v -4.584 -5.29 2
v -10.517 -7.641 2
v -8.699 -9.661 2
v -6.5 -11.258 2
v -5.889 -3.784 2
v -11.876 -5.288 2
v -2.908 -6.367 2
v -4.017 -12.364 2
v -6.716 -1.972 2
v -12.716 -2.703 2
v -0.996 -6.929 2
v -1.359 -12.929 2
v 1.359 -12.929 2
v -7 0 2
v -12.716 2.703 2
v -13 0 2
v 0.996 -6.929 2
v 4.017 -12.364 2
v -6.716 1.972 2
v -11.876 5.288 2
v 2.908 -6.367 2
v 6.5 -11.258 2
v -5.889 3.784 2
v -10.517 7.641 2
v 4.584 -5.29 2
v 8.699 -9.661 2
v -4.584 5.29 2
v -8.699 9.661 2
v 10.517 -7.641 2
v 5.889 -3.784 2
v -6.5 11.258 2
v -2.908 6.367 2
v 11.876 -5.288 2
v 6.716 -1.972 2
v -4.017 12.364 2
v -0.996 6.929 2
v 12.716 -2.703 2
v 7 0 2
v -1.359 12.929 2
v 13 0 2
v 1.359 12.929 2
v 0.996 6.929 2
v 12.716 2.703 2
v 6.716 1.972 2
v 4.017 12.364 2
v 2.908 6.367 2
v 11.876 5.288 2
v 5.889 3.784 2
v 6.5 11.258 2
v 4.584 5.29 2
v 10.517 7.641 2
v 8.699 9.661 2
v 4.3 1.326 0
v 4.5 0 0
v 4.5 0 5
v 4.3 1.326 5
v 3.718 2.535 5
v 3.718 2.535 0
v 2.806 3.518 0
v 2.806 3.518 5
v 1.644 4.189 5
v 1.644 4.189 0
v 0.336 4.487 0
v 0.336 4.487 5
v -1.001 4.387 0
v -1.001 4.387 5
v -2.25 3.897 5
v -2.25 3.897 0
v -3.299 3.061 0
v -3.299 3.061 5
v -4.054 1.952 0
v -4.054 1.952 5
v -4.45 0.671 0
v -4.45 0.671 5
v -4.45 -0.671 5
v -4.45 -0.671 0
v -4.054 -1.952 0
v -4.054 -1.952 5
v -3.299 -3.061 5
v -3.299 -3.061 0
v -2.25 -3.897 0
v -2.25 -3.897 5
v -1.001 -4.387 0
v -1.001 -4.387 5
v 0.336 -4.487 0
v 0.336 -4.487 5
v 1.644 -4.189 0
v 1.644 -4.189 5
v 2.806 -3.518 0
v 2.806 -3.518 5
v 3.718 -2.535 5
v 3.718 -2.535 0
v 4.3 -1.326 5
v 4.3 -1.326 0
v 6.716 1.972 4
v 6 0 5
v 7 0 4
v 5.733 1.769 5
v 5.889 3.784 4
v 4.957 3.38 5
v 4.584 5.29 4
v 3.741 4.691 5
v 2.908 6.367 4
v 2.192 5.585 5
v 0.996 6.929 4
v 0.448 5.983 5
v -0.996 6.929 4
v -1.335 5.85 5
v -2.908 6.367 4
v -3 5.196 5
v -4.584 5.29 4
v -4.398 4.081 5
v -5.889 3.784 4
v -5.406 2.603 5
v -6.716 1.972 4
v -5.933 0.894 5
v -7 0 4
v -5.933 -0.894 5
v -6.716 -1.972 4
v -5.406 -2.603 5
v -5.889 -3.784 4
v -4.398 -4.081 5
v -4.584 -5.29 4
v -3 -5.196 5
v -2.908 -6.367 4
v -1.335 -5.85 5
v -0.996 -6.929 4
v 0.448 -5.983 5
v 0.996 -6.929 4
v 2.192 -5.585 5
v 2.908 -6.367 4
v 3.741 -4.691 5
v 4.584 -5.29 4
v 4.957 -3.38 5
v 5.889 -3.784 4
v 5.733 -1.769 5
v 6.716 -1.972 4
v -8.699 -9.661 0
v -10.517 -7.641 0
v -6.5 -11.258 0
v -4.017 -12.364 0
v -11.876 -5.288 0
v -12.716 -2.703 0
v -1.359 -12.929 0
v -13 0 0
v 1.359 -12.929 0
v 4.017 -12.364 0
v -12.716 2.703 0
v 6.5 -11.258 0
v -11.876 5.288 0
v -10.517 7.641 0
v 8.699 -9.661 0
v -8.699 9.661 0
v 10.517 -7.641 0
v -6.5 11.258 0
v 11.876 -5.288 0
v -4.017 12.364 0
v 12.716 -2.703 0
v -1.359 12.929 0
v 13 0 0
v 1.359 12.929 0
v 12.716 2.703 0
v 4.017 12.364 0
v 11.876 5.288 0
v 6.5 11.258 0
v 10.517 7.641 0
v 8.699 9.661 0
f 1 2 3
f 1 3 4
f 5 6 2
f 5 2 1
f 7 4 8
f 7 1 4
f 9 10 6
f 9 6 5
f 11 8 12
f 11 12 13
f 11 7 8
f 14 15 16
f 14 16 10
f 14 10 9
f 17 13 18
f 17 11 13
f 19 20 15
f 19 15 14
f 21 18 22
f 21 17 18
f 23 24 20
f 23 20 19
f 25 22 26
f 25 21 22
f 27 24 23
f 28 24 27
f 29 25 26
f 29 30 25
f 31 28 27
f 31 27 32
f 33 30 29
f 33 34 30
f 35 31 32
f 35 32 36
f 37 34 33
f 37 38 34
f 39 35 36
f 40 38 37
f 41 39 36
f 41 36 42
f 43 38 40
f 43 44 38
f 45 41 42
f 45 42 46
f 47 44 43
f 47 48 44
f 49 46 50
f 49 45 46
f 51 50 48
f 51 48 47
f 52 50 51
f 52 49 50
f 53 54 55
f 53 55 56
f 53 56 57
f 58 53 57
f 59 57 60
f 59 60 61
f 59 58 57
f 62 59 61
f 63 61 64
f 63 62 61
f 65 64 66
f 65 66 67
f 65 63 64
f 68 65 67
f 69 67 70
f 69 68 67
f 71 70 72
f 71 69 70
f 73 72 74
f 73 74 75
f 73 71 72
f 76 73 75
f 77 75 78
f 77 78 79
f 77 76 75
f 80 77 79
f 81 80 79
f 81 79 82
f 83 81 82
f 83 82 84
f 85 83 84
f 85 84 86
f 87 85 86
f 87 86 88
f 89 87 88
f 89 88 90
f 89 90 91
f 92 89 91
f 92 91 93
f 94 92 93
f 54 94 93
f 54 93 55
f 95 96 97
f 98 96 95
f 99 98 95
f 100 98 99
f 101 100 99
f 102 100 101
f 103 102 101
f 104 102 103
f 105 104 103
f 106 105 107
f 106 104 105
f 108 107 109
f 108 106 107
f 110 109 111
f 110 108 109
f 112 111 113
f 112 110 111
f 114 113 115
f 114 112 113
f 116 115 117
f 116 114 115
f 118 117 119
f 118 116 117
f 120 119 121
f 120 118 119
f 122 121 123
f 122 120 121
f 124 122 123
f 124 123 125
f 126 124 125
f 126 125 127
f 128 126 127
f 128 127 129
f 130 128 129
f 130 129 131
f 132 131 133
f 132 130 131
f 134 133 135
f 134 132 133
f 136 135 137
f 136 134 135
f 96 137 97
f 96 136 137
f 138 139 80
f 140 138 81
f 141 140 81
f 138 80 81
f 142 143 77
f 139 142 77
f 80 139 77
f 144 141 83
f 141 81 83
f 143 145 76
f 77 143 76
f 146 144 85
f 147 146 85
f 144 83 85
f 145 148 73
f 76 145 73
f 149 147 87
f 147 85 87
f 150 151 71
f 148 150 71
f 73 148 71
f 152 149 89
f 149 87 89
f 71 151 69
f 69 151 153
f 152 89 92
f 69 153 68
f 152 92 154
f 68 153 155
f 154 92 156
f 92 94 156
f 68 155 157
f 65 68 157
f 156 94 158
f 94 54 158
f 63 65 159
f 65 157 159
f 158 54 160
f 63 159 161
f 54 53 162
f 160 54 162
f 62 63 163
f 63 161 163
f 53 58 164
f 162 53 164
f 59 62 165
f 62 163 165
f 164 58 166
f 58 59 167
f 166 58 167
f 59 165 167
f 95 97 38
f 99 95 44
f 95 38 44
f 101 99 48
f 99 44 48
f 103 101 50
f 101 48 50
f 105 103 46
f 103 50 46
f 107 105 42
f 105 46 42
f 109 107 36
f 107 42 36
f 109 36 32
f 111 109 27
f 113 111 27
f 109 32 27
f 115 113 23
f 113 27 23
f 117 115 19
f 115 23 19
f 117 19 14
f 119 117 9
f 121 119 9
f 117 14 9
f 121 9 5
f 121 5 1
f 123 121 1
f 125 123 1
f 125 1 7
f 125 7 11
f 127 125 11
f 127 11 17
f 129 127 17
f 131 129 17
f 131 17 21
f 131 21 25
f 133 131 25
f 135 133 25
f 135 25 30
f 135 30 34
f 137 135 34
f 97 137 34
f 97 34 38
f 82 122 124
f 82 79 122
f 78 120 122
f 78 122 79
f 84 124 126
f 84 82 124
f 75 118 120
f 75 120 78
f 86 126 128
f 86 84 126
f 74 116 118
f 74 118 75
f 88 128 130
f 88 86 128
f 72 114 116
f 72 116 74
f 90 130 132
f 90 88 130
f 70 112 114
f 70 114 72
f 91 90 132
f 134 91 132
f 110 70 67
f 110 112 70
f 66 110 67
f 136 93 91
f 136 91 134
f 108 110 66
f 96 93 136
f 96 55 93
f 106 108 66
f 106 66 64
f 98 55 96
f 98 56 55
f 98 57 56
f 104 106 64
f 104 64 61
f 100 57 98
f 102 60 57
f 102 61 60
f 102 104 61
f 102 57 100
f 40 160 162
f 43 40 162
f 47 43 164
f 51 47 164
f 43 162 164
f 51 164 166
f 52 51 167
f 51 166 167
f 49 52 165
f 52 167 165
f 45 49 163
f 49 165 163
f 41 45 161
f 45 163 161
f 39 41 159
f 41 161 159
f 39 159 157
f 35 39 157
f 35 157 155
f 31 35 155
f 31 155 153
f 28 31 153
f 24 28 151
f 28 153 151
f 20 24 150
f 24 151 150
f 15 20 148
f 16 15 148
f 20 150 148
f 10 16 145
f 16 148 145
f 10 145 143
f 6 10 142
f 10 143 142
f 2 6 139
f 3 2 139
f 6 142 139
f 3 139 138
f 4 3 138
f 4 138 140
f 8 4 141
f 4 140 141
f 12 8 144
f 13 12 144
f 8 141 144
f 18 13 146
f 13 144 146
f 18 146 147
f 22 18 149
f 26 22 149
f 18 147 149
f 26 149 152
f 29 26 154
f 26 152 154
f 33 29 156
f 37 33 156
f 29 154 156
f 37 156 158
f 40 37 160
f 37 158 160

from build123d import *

# Parameters (mm, degrees)
SKETCH1_R           = 13
SKETCH1_R_2         = 4.5
BOSS_EXTRUDE1_DEPTH = 2
SKETCH1_3_R         = 7
SKETCH1_3_R_2       = 4.5
BOSS_EXTRUDE2_DEPTH = 5
CHAMFER1_SIZE       = 1


with BuildPart() as part:
    # Sketch1 → Boss-Extrude1 (new body)
    with BuildSketch(Plane.XY):
        Circle(SKETCH1_R)
        Circle(SKETCH1_R_2, mode=Mode.SUBTRACT)
    extrude(amount=BOSS_EXTRUDE1_DEPTH)

    # Sketch1<3> → Boss-Extrude2 (add)
    with BuildSketch(Plane.XY):
        Circle(SKETCH1_3_R)
        Circle(SKETCH1_3_R_2, mode=Mode.SUBTRACT)
    extrude(amount=BOSS_EXTRUDE2_DEPTH)

    # Chamfer1
    chamfer1_edges = [part.edges().sort_by_distance(p)[0] for p in [
        (-7, 0, 5),
    ]]
    chamfer(chamfer1_edges, length=CHAMFER1_SIZE)


solid = part.part
